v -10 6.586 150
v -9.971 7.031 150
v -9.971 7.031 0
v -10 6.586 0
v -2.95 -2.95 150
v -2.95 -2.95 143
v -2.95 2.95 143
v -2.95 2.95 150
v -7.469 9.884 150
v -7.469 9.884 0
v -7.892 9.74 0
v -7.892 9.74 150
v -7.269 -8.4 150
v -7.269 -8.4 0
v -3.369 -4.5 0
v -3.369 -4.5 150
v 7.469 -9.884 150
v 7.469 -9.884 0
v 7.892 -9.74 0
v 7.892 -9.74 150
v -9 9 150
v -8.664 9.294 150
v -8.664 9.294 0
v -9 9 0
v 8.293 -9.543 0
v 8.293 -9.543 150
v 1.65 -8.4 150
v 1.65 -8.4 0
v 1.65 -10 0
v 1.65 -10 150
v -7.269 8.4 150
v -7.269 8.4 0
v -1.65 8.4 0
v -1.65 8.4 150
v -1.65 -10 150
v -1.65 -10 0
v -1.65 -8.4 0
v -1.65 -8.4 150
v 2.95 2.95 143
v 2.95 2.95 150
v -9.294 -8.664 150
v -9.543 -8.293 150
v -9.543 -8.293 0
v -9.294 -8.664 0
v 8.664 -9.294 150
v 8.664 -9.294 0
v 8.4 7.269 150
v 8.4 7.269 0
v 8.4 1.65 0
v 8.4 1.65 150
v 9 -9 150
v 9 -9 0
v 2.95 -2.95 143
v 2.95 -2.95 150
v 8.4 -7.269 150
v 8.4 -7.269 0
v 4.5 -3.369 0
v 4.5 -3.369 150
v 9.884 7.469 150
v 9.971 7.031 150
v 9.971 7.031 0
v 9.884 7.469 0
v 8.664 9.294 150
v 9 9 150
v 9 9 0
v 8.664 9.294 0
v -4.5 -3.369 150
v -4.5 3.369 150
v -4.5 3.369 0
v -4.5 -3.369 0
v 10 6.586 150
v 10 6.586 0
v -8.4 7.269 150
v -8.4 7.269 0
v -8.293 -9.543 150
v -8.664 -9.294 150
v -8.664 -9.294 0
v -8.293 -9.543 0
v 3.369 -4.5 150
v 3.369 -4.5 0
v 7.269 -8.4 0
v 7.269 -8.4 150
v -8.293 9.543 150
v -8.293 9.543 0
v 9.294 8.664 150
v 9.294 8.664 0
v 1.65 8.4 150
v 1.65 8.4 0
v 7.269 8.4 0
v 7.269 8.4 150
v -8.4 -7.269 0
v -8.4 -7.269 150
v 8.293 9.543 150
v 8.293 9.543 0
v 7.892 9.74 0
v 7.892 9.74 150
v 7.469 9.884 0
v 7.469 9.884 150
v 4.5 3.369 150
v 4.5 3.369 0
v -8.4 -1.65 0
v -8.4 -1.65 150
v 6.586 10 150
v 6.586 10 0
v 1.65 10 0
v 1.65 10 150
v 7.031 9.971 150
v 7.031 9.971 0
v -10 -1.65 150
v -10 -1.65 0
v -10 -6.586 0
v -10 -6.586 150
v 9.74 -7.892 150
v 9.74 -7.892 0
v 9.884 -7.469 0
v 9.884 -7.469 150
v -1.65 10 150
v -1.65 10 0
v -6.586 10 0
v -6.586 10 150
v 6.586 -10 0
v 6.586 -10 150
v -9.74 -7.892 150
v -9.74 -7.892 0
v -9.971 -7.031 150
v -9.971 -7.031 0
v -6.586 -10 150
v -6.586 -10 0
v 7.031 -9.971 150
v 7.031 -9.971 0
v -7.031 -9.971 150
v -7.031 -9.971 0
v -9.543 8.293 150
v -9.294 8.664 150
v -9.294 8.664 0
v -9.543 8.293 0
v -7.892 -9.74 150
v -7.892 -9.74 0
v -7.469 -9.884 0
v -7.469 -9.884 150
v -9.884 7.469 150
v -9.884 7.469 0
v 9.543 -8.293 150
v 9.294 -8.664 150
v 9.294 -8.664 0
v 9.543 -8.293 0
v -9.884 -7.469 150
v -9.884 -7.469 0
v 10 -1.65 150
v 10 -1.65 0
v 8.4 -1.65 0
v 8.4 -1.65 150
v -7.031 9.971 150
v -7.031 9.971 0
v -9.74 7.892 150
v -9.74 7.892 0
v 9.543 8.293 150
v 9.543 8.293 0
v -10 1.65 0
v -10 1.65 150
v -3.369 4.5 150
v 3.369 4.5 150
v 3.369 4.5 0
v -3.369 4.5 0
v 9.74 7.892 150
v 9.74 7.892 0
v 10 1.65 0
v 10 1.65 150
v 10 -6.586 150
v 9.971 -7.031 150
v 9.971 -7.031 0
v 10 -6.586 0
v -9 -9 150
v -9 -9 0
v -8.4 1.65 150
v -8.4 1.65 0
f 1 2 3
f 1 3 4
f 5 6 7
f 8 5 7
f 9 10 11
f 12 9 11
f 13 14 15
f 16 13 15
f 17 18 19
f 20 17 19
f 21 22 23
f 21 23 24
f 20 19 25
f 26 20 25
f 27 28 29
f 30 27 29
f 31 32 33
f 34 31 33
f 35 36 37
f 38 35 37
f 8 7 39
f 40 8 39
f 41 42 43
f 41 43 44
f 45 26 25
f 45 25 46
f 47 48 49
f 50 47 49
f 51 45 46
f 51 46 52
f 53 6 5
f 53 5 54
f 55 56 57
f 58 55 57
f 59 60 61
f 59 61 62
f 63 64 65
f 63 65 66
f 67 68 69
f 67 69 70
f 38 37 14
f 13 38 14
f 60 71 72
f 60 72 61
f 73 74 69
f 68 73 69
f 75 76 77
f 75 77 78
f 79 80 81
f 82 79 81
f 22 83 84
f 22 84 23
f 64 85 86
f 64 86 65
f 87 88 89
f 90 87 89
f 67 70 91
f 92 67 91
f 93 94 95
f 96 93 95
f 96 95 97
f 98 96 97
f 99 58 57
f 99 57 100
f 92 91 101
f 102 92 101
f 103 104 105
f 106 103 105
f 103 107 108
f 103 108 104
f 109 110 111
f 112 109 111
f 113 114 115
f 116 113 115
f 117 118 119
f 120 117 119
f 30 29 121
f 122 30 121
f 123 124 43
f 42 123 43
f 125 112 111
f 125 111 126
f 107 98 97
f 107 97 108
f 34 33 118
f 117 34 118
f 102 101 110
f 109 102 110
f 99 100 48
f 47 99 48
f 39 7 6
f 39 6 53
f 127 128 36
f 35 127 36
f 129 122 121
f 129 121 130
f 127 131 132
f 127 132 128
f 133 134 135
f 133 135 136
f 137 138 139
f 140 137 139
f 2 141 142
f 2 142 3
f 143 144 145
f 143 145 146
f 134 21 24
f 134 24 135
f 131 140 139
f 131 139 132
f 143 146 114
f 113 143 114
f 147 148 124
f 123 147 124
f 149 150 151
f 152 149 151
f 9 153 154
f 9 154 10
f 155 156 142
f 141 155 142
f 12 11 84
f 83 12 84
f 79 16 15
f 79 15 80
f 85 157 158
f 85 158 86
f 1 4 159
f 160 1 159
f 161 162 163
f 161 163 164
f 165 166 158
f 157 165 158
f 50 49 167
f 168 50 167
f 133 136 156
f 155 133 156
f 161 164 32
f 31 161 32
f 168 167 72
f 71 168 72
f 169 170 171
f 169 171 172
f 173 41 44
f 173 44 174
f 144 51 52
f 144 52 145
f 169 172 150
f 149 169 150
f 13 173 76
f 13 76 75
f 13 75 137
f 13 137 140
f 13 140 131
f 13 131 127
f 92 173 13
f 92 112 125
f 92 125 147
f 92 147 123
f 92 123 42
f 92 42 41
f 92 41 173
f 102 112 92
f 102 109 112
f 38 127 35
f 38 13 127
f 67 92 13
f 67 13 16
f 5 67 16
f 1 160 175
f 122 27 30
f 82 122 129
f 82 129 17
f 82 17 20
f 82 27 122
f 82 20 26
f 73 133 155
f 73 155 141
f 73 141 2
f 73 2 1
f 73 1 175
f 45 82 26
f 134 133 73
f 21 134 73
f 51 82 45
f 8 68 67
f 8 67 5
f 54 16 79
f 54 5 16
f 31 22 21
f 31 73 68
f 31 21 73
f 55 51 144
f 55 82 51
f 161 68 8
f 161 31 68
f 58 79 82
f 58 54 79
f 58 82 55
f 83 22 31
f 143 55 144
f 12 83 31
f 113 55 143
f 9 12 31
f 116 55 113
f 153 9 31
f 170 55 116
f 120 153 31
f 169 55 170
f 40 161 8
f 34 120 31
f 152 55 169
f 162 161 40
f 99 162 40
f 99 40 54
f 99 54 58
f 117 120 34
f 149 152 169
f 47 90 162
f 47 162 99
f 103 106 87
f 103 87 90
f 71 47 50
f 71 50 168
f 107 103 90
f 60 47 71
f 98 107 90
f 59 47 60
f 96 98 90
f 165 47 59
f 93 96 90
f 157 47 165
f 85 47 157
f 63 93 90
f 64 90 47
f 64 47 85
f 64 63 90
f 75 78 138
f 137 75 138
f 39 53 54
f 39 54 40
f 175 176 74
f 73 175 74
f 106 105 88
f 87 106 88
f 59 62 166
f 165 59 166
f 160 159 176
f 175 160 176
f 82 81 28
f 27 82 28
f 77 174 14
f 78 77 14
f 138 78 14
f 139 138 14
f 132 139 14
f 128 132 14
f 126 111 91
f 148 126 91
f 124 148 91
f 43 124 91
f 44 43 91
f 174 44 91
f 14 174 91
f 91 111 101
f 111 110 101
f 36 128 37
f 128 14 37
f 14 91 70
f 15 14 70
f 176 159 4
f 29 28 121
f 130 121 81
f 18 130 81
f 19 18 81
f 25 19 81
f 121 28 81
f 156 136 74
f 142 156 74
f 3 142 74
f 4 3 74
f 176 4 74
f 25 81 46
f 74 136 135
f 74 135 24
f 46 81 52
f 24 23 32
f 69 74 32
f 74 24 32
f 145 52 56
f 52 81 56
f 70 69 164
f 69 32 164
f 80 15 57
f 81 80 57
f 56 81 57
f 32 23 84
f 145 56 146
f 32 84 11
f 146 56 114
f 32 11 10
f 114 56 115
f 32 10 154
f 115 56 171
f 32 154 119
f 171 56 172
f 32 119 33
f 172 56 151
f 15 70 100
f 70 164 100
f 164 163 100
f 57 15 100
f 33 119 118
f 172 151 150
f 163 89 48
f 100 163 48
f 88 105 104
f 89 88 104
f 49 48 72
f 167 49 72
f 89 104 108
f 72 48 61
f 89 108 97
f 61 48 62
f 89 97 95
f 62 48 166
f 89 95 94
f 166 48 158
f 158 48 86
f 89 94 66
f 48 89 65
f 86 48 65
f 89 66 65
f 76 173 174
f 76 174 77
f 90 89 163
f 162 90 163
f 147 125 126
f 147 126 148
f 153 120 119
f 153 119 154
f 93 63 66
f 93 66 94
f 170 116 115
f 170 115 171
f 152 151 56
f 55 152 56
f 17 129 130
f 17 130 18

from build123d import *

# Parameters (mm, degrees)
F1_DEPTH = 150
F3_START = 143
F2_W     = 5.9
F2_H     = 5.9
F3_DEPTH = 14


with BuildPart() as f1:
    # F0 (on Top) → F1 (new body)
    with BuildSketch(Plane.XY):
        Polygon((-8.6642279688, 9.2944640897), (-9.0000005454, 9.0000005454), (-9.2944640897, 8.6642279688), (-9.5425827994, 8.2928939011), (-9.740108966, 7.8923494527), (-9.8836638753, 7.4694502231), (-9.9707914372, 7.0314308605), (-10, 6.5857868932), (-10, 1.6499997364), (-8.4000001454, 1.6499997364), (-8.4000001454, 7.2686289692), (-4.5000002727, 3.3686290964), (-4.5000002727, -3.3686290964), (-8.4000001454, -7.2686289692), (-8.4000001454, -1.6499997364), (-10, -1.6499997364), (-10, -6.5857868932), (-9.9707914372, -7.0314308605), (-9.8836638753, -7.4694502231), (-9.740108966, -7.8923494527), (-9.5425827994, -8.2928939011), (-9.2944640897, -8.6642279688), (-9.0000005454, -9.0000005454), (-8.6642279688, -9.2944640897), (-8.2928939011, -9.5425827994), (-7.8923494527, -9.740108966), (-7.4694502231, -9.8836638753), (-7.0314308605, -9.9707914372), (-6.5857868932, -10), (-1.6499997364, -10), (-1.6499997364, -8.4000001454), (-7.2686289692, -8.4000001454), (-3.3686290964, -4.5000002727), (3.3686290964, -4.5000002727), (7.2686289692, -8.4000001454), (1.6499997364, -8.4000001454), (1.6499997364, -10), (6.5857868932, -10), (7.0314308605, -9.9707914372), (7.4694502231, -9.8836638753), (7.8923494527, -9.740108966), (8.2928939011, -9.5425827994), (8.6642279688, -9.2944640897), (9.0000005454, -9.0000005454), (9.2944640897, -8.6642279688), (9.5425827994, -8.2928939011), (9.740108966, -7.8923494527), (9.8836638753, -7.4694502231), (9.9707914372, -7.0314308605), (10, -6.5857868932), (10, -1.6499997364), (8.4000001454, -1.6499997364), (8.4000001454, -7.2686289692), (4.5000002727, -3.3686290964), (4.5000002727, 3.3686290964), (8.4000001454, 7.2686289692), (8.4000001454, 1.6499997364), (10, 1.6499997364), (10, 6.5857868932), (9.9707914372, 7.0314308605), (9.8836638753, 7.4694502231), (9.740108966, 7.8923494527), (9.5425827994, 8.2928939011), (9.2944640897, 8.6642279688), (9.0000005454, 9.0000005454), (8.6642279688, 9.2944640897), (8.2928939011, 9.5425827994), (7.8923494527, 9.740108966), (7.4694502231, 9.8836638753), (7.0314308605, 9.9707914372), (6.5857868932, 10), (1.6499997364, 10), (1.6499997364, 8.4000001454), (7.2686289692, 8.4000001454), (3.3686290964, 4.5000002727), (-3.3686290964, 4.5000002727), (-7.2686289692, 8.4000001454), (-1.6499997364, 8.4000001454), (-1.6499997364, 10), (-6.5857868932, 10), (-7.0314308605, 9.9707914372), (-7.4694502231, 9.8836638753), (-7.8923494527, 9.740108966), (-8.2928939011, 9.5425827994), align=None)
    extrude(amount=F1_DEPTH)

    # F2 (on Top) → F3 (cut)
    with BuildSketch(Plane.XY.offset(F3_START)):
        Rectangle(F2_W, F2_H)
    extrude(amount=F3_DEPTH, mode=Mode.SUBTRACT)


solid = f1.part
